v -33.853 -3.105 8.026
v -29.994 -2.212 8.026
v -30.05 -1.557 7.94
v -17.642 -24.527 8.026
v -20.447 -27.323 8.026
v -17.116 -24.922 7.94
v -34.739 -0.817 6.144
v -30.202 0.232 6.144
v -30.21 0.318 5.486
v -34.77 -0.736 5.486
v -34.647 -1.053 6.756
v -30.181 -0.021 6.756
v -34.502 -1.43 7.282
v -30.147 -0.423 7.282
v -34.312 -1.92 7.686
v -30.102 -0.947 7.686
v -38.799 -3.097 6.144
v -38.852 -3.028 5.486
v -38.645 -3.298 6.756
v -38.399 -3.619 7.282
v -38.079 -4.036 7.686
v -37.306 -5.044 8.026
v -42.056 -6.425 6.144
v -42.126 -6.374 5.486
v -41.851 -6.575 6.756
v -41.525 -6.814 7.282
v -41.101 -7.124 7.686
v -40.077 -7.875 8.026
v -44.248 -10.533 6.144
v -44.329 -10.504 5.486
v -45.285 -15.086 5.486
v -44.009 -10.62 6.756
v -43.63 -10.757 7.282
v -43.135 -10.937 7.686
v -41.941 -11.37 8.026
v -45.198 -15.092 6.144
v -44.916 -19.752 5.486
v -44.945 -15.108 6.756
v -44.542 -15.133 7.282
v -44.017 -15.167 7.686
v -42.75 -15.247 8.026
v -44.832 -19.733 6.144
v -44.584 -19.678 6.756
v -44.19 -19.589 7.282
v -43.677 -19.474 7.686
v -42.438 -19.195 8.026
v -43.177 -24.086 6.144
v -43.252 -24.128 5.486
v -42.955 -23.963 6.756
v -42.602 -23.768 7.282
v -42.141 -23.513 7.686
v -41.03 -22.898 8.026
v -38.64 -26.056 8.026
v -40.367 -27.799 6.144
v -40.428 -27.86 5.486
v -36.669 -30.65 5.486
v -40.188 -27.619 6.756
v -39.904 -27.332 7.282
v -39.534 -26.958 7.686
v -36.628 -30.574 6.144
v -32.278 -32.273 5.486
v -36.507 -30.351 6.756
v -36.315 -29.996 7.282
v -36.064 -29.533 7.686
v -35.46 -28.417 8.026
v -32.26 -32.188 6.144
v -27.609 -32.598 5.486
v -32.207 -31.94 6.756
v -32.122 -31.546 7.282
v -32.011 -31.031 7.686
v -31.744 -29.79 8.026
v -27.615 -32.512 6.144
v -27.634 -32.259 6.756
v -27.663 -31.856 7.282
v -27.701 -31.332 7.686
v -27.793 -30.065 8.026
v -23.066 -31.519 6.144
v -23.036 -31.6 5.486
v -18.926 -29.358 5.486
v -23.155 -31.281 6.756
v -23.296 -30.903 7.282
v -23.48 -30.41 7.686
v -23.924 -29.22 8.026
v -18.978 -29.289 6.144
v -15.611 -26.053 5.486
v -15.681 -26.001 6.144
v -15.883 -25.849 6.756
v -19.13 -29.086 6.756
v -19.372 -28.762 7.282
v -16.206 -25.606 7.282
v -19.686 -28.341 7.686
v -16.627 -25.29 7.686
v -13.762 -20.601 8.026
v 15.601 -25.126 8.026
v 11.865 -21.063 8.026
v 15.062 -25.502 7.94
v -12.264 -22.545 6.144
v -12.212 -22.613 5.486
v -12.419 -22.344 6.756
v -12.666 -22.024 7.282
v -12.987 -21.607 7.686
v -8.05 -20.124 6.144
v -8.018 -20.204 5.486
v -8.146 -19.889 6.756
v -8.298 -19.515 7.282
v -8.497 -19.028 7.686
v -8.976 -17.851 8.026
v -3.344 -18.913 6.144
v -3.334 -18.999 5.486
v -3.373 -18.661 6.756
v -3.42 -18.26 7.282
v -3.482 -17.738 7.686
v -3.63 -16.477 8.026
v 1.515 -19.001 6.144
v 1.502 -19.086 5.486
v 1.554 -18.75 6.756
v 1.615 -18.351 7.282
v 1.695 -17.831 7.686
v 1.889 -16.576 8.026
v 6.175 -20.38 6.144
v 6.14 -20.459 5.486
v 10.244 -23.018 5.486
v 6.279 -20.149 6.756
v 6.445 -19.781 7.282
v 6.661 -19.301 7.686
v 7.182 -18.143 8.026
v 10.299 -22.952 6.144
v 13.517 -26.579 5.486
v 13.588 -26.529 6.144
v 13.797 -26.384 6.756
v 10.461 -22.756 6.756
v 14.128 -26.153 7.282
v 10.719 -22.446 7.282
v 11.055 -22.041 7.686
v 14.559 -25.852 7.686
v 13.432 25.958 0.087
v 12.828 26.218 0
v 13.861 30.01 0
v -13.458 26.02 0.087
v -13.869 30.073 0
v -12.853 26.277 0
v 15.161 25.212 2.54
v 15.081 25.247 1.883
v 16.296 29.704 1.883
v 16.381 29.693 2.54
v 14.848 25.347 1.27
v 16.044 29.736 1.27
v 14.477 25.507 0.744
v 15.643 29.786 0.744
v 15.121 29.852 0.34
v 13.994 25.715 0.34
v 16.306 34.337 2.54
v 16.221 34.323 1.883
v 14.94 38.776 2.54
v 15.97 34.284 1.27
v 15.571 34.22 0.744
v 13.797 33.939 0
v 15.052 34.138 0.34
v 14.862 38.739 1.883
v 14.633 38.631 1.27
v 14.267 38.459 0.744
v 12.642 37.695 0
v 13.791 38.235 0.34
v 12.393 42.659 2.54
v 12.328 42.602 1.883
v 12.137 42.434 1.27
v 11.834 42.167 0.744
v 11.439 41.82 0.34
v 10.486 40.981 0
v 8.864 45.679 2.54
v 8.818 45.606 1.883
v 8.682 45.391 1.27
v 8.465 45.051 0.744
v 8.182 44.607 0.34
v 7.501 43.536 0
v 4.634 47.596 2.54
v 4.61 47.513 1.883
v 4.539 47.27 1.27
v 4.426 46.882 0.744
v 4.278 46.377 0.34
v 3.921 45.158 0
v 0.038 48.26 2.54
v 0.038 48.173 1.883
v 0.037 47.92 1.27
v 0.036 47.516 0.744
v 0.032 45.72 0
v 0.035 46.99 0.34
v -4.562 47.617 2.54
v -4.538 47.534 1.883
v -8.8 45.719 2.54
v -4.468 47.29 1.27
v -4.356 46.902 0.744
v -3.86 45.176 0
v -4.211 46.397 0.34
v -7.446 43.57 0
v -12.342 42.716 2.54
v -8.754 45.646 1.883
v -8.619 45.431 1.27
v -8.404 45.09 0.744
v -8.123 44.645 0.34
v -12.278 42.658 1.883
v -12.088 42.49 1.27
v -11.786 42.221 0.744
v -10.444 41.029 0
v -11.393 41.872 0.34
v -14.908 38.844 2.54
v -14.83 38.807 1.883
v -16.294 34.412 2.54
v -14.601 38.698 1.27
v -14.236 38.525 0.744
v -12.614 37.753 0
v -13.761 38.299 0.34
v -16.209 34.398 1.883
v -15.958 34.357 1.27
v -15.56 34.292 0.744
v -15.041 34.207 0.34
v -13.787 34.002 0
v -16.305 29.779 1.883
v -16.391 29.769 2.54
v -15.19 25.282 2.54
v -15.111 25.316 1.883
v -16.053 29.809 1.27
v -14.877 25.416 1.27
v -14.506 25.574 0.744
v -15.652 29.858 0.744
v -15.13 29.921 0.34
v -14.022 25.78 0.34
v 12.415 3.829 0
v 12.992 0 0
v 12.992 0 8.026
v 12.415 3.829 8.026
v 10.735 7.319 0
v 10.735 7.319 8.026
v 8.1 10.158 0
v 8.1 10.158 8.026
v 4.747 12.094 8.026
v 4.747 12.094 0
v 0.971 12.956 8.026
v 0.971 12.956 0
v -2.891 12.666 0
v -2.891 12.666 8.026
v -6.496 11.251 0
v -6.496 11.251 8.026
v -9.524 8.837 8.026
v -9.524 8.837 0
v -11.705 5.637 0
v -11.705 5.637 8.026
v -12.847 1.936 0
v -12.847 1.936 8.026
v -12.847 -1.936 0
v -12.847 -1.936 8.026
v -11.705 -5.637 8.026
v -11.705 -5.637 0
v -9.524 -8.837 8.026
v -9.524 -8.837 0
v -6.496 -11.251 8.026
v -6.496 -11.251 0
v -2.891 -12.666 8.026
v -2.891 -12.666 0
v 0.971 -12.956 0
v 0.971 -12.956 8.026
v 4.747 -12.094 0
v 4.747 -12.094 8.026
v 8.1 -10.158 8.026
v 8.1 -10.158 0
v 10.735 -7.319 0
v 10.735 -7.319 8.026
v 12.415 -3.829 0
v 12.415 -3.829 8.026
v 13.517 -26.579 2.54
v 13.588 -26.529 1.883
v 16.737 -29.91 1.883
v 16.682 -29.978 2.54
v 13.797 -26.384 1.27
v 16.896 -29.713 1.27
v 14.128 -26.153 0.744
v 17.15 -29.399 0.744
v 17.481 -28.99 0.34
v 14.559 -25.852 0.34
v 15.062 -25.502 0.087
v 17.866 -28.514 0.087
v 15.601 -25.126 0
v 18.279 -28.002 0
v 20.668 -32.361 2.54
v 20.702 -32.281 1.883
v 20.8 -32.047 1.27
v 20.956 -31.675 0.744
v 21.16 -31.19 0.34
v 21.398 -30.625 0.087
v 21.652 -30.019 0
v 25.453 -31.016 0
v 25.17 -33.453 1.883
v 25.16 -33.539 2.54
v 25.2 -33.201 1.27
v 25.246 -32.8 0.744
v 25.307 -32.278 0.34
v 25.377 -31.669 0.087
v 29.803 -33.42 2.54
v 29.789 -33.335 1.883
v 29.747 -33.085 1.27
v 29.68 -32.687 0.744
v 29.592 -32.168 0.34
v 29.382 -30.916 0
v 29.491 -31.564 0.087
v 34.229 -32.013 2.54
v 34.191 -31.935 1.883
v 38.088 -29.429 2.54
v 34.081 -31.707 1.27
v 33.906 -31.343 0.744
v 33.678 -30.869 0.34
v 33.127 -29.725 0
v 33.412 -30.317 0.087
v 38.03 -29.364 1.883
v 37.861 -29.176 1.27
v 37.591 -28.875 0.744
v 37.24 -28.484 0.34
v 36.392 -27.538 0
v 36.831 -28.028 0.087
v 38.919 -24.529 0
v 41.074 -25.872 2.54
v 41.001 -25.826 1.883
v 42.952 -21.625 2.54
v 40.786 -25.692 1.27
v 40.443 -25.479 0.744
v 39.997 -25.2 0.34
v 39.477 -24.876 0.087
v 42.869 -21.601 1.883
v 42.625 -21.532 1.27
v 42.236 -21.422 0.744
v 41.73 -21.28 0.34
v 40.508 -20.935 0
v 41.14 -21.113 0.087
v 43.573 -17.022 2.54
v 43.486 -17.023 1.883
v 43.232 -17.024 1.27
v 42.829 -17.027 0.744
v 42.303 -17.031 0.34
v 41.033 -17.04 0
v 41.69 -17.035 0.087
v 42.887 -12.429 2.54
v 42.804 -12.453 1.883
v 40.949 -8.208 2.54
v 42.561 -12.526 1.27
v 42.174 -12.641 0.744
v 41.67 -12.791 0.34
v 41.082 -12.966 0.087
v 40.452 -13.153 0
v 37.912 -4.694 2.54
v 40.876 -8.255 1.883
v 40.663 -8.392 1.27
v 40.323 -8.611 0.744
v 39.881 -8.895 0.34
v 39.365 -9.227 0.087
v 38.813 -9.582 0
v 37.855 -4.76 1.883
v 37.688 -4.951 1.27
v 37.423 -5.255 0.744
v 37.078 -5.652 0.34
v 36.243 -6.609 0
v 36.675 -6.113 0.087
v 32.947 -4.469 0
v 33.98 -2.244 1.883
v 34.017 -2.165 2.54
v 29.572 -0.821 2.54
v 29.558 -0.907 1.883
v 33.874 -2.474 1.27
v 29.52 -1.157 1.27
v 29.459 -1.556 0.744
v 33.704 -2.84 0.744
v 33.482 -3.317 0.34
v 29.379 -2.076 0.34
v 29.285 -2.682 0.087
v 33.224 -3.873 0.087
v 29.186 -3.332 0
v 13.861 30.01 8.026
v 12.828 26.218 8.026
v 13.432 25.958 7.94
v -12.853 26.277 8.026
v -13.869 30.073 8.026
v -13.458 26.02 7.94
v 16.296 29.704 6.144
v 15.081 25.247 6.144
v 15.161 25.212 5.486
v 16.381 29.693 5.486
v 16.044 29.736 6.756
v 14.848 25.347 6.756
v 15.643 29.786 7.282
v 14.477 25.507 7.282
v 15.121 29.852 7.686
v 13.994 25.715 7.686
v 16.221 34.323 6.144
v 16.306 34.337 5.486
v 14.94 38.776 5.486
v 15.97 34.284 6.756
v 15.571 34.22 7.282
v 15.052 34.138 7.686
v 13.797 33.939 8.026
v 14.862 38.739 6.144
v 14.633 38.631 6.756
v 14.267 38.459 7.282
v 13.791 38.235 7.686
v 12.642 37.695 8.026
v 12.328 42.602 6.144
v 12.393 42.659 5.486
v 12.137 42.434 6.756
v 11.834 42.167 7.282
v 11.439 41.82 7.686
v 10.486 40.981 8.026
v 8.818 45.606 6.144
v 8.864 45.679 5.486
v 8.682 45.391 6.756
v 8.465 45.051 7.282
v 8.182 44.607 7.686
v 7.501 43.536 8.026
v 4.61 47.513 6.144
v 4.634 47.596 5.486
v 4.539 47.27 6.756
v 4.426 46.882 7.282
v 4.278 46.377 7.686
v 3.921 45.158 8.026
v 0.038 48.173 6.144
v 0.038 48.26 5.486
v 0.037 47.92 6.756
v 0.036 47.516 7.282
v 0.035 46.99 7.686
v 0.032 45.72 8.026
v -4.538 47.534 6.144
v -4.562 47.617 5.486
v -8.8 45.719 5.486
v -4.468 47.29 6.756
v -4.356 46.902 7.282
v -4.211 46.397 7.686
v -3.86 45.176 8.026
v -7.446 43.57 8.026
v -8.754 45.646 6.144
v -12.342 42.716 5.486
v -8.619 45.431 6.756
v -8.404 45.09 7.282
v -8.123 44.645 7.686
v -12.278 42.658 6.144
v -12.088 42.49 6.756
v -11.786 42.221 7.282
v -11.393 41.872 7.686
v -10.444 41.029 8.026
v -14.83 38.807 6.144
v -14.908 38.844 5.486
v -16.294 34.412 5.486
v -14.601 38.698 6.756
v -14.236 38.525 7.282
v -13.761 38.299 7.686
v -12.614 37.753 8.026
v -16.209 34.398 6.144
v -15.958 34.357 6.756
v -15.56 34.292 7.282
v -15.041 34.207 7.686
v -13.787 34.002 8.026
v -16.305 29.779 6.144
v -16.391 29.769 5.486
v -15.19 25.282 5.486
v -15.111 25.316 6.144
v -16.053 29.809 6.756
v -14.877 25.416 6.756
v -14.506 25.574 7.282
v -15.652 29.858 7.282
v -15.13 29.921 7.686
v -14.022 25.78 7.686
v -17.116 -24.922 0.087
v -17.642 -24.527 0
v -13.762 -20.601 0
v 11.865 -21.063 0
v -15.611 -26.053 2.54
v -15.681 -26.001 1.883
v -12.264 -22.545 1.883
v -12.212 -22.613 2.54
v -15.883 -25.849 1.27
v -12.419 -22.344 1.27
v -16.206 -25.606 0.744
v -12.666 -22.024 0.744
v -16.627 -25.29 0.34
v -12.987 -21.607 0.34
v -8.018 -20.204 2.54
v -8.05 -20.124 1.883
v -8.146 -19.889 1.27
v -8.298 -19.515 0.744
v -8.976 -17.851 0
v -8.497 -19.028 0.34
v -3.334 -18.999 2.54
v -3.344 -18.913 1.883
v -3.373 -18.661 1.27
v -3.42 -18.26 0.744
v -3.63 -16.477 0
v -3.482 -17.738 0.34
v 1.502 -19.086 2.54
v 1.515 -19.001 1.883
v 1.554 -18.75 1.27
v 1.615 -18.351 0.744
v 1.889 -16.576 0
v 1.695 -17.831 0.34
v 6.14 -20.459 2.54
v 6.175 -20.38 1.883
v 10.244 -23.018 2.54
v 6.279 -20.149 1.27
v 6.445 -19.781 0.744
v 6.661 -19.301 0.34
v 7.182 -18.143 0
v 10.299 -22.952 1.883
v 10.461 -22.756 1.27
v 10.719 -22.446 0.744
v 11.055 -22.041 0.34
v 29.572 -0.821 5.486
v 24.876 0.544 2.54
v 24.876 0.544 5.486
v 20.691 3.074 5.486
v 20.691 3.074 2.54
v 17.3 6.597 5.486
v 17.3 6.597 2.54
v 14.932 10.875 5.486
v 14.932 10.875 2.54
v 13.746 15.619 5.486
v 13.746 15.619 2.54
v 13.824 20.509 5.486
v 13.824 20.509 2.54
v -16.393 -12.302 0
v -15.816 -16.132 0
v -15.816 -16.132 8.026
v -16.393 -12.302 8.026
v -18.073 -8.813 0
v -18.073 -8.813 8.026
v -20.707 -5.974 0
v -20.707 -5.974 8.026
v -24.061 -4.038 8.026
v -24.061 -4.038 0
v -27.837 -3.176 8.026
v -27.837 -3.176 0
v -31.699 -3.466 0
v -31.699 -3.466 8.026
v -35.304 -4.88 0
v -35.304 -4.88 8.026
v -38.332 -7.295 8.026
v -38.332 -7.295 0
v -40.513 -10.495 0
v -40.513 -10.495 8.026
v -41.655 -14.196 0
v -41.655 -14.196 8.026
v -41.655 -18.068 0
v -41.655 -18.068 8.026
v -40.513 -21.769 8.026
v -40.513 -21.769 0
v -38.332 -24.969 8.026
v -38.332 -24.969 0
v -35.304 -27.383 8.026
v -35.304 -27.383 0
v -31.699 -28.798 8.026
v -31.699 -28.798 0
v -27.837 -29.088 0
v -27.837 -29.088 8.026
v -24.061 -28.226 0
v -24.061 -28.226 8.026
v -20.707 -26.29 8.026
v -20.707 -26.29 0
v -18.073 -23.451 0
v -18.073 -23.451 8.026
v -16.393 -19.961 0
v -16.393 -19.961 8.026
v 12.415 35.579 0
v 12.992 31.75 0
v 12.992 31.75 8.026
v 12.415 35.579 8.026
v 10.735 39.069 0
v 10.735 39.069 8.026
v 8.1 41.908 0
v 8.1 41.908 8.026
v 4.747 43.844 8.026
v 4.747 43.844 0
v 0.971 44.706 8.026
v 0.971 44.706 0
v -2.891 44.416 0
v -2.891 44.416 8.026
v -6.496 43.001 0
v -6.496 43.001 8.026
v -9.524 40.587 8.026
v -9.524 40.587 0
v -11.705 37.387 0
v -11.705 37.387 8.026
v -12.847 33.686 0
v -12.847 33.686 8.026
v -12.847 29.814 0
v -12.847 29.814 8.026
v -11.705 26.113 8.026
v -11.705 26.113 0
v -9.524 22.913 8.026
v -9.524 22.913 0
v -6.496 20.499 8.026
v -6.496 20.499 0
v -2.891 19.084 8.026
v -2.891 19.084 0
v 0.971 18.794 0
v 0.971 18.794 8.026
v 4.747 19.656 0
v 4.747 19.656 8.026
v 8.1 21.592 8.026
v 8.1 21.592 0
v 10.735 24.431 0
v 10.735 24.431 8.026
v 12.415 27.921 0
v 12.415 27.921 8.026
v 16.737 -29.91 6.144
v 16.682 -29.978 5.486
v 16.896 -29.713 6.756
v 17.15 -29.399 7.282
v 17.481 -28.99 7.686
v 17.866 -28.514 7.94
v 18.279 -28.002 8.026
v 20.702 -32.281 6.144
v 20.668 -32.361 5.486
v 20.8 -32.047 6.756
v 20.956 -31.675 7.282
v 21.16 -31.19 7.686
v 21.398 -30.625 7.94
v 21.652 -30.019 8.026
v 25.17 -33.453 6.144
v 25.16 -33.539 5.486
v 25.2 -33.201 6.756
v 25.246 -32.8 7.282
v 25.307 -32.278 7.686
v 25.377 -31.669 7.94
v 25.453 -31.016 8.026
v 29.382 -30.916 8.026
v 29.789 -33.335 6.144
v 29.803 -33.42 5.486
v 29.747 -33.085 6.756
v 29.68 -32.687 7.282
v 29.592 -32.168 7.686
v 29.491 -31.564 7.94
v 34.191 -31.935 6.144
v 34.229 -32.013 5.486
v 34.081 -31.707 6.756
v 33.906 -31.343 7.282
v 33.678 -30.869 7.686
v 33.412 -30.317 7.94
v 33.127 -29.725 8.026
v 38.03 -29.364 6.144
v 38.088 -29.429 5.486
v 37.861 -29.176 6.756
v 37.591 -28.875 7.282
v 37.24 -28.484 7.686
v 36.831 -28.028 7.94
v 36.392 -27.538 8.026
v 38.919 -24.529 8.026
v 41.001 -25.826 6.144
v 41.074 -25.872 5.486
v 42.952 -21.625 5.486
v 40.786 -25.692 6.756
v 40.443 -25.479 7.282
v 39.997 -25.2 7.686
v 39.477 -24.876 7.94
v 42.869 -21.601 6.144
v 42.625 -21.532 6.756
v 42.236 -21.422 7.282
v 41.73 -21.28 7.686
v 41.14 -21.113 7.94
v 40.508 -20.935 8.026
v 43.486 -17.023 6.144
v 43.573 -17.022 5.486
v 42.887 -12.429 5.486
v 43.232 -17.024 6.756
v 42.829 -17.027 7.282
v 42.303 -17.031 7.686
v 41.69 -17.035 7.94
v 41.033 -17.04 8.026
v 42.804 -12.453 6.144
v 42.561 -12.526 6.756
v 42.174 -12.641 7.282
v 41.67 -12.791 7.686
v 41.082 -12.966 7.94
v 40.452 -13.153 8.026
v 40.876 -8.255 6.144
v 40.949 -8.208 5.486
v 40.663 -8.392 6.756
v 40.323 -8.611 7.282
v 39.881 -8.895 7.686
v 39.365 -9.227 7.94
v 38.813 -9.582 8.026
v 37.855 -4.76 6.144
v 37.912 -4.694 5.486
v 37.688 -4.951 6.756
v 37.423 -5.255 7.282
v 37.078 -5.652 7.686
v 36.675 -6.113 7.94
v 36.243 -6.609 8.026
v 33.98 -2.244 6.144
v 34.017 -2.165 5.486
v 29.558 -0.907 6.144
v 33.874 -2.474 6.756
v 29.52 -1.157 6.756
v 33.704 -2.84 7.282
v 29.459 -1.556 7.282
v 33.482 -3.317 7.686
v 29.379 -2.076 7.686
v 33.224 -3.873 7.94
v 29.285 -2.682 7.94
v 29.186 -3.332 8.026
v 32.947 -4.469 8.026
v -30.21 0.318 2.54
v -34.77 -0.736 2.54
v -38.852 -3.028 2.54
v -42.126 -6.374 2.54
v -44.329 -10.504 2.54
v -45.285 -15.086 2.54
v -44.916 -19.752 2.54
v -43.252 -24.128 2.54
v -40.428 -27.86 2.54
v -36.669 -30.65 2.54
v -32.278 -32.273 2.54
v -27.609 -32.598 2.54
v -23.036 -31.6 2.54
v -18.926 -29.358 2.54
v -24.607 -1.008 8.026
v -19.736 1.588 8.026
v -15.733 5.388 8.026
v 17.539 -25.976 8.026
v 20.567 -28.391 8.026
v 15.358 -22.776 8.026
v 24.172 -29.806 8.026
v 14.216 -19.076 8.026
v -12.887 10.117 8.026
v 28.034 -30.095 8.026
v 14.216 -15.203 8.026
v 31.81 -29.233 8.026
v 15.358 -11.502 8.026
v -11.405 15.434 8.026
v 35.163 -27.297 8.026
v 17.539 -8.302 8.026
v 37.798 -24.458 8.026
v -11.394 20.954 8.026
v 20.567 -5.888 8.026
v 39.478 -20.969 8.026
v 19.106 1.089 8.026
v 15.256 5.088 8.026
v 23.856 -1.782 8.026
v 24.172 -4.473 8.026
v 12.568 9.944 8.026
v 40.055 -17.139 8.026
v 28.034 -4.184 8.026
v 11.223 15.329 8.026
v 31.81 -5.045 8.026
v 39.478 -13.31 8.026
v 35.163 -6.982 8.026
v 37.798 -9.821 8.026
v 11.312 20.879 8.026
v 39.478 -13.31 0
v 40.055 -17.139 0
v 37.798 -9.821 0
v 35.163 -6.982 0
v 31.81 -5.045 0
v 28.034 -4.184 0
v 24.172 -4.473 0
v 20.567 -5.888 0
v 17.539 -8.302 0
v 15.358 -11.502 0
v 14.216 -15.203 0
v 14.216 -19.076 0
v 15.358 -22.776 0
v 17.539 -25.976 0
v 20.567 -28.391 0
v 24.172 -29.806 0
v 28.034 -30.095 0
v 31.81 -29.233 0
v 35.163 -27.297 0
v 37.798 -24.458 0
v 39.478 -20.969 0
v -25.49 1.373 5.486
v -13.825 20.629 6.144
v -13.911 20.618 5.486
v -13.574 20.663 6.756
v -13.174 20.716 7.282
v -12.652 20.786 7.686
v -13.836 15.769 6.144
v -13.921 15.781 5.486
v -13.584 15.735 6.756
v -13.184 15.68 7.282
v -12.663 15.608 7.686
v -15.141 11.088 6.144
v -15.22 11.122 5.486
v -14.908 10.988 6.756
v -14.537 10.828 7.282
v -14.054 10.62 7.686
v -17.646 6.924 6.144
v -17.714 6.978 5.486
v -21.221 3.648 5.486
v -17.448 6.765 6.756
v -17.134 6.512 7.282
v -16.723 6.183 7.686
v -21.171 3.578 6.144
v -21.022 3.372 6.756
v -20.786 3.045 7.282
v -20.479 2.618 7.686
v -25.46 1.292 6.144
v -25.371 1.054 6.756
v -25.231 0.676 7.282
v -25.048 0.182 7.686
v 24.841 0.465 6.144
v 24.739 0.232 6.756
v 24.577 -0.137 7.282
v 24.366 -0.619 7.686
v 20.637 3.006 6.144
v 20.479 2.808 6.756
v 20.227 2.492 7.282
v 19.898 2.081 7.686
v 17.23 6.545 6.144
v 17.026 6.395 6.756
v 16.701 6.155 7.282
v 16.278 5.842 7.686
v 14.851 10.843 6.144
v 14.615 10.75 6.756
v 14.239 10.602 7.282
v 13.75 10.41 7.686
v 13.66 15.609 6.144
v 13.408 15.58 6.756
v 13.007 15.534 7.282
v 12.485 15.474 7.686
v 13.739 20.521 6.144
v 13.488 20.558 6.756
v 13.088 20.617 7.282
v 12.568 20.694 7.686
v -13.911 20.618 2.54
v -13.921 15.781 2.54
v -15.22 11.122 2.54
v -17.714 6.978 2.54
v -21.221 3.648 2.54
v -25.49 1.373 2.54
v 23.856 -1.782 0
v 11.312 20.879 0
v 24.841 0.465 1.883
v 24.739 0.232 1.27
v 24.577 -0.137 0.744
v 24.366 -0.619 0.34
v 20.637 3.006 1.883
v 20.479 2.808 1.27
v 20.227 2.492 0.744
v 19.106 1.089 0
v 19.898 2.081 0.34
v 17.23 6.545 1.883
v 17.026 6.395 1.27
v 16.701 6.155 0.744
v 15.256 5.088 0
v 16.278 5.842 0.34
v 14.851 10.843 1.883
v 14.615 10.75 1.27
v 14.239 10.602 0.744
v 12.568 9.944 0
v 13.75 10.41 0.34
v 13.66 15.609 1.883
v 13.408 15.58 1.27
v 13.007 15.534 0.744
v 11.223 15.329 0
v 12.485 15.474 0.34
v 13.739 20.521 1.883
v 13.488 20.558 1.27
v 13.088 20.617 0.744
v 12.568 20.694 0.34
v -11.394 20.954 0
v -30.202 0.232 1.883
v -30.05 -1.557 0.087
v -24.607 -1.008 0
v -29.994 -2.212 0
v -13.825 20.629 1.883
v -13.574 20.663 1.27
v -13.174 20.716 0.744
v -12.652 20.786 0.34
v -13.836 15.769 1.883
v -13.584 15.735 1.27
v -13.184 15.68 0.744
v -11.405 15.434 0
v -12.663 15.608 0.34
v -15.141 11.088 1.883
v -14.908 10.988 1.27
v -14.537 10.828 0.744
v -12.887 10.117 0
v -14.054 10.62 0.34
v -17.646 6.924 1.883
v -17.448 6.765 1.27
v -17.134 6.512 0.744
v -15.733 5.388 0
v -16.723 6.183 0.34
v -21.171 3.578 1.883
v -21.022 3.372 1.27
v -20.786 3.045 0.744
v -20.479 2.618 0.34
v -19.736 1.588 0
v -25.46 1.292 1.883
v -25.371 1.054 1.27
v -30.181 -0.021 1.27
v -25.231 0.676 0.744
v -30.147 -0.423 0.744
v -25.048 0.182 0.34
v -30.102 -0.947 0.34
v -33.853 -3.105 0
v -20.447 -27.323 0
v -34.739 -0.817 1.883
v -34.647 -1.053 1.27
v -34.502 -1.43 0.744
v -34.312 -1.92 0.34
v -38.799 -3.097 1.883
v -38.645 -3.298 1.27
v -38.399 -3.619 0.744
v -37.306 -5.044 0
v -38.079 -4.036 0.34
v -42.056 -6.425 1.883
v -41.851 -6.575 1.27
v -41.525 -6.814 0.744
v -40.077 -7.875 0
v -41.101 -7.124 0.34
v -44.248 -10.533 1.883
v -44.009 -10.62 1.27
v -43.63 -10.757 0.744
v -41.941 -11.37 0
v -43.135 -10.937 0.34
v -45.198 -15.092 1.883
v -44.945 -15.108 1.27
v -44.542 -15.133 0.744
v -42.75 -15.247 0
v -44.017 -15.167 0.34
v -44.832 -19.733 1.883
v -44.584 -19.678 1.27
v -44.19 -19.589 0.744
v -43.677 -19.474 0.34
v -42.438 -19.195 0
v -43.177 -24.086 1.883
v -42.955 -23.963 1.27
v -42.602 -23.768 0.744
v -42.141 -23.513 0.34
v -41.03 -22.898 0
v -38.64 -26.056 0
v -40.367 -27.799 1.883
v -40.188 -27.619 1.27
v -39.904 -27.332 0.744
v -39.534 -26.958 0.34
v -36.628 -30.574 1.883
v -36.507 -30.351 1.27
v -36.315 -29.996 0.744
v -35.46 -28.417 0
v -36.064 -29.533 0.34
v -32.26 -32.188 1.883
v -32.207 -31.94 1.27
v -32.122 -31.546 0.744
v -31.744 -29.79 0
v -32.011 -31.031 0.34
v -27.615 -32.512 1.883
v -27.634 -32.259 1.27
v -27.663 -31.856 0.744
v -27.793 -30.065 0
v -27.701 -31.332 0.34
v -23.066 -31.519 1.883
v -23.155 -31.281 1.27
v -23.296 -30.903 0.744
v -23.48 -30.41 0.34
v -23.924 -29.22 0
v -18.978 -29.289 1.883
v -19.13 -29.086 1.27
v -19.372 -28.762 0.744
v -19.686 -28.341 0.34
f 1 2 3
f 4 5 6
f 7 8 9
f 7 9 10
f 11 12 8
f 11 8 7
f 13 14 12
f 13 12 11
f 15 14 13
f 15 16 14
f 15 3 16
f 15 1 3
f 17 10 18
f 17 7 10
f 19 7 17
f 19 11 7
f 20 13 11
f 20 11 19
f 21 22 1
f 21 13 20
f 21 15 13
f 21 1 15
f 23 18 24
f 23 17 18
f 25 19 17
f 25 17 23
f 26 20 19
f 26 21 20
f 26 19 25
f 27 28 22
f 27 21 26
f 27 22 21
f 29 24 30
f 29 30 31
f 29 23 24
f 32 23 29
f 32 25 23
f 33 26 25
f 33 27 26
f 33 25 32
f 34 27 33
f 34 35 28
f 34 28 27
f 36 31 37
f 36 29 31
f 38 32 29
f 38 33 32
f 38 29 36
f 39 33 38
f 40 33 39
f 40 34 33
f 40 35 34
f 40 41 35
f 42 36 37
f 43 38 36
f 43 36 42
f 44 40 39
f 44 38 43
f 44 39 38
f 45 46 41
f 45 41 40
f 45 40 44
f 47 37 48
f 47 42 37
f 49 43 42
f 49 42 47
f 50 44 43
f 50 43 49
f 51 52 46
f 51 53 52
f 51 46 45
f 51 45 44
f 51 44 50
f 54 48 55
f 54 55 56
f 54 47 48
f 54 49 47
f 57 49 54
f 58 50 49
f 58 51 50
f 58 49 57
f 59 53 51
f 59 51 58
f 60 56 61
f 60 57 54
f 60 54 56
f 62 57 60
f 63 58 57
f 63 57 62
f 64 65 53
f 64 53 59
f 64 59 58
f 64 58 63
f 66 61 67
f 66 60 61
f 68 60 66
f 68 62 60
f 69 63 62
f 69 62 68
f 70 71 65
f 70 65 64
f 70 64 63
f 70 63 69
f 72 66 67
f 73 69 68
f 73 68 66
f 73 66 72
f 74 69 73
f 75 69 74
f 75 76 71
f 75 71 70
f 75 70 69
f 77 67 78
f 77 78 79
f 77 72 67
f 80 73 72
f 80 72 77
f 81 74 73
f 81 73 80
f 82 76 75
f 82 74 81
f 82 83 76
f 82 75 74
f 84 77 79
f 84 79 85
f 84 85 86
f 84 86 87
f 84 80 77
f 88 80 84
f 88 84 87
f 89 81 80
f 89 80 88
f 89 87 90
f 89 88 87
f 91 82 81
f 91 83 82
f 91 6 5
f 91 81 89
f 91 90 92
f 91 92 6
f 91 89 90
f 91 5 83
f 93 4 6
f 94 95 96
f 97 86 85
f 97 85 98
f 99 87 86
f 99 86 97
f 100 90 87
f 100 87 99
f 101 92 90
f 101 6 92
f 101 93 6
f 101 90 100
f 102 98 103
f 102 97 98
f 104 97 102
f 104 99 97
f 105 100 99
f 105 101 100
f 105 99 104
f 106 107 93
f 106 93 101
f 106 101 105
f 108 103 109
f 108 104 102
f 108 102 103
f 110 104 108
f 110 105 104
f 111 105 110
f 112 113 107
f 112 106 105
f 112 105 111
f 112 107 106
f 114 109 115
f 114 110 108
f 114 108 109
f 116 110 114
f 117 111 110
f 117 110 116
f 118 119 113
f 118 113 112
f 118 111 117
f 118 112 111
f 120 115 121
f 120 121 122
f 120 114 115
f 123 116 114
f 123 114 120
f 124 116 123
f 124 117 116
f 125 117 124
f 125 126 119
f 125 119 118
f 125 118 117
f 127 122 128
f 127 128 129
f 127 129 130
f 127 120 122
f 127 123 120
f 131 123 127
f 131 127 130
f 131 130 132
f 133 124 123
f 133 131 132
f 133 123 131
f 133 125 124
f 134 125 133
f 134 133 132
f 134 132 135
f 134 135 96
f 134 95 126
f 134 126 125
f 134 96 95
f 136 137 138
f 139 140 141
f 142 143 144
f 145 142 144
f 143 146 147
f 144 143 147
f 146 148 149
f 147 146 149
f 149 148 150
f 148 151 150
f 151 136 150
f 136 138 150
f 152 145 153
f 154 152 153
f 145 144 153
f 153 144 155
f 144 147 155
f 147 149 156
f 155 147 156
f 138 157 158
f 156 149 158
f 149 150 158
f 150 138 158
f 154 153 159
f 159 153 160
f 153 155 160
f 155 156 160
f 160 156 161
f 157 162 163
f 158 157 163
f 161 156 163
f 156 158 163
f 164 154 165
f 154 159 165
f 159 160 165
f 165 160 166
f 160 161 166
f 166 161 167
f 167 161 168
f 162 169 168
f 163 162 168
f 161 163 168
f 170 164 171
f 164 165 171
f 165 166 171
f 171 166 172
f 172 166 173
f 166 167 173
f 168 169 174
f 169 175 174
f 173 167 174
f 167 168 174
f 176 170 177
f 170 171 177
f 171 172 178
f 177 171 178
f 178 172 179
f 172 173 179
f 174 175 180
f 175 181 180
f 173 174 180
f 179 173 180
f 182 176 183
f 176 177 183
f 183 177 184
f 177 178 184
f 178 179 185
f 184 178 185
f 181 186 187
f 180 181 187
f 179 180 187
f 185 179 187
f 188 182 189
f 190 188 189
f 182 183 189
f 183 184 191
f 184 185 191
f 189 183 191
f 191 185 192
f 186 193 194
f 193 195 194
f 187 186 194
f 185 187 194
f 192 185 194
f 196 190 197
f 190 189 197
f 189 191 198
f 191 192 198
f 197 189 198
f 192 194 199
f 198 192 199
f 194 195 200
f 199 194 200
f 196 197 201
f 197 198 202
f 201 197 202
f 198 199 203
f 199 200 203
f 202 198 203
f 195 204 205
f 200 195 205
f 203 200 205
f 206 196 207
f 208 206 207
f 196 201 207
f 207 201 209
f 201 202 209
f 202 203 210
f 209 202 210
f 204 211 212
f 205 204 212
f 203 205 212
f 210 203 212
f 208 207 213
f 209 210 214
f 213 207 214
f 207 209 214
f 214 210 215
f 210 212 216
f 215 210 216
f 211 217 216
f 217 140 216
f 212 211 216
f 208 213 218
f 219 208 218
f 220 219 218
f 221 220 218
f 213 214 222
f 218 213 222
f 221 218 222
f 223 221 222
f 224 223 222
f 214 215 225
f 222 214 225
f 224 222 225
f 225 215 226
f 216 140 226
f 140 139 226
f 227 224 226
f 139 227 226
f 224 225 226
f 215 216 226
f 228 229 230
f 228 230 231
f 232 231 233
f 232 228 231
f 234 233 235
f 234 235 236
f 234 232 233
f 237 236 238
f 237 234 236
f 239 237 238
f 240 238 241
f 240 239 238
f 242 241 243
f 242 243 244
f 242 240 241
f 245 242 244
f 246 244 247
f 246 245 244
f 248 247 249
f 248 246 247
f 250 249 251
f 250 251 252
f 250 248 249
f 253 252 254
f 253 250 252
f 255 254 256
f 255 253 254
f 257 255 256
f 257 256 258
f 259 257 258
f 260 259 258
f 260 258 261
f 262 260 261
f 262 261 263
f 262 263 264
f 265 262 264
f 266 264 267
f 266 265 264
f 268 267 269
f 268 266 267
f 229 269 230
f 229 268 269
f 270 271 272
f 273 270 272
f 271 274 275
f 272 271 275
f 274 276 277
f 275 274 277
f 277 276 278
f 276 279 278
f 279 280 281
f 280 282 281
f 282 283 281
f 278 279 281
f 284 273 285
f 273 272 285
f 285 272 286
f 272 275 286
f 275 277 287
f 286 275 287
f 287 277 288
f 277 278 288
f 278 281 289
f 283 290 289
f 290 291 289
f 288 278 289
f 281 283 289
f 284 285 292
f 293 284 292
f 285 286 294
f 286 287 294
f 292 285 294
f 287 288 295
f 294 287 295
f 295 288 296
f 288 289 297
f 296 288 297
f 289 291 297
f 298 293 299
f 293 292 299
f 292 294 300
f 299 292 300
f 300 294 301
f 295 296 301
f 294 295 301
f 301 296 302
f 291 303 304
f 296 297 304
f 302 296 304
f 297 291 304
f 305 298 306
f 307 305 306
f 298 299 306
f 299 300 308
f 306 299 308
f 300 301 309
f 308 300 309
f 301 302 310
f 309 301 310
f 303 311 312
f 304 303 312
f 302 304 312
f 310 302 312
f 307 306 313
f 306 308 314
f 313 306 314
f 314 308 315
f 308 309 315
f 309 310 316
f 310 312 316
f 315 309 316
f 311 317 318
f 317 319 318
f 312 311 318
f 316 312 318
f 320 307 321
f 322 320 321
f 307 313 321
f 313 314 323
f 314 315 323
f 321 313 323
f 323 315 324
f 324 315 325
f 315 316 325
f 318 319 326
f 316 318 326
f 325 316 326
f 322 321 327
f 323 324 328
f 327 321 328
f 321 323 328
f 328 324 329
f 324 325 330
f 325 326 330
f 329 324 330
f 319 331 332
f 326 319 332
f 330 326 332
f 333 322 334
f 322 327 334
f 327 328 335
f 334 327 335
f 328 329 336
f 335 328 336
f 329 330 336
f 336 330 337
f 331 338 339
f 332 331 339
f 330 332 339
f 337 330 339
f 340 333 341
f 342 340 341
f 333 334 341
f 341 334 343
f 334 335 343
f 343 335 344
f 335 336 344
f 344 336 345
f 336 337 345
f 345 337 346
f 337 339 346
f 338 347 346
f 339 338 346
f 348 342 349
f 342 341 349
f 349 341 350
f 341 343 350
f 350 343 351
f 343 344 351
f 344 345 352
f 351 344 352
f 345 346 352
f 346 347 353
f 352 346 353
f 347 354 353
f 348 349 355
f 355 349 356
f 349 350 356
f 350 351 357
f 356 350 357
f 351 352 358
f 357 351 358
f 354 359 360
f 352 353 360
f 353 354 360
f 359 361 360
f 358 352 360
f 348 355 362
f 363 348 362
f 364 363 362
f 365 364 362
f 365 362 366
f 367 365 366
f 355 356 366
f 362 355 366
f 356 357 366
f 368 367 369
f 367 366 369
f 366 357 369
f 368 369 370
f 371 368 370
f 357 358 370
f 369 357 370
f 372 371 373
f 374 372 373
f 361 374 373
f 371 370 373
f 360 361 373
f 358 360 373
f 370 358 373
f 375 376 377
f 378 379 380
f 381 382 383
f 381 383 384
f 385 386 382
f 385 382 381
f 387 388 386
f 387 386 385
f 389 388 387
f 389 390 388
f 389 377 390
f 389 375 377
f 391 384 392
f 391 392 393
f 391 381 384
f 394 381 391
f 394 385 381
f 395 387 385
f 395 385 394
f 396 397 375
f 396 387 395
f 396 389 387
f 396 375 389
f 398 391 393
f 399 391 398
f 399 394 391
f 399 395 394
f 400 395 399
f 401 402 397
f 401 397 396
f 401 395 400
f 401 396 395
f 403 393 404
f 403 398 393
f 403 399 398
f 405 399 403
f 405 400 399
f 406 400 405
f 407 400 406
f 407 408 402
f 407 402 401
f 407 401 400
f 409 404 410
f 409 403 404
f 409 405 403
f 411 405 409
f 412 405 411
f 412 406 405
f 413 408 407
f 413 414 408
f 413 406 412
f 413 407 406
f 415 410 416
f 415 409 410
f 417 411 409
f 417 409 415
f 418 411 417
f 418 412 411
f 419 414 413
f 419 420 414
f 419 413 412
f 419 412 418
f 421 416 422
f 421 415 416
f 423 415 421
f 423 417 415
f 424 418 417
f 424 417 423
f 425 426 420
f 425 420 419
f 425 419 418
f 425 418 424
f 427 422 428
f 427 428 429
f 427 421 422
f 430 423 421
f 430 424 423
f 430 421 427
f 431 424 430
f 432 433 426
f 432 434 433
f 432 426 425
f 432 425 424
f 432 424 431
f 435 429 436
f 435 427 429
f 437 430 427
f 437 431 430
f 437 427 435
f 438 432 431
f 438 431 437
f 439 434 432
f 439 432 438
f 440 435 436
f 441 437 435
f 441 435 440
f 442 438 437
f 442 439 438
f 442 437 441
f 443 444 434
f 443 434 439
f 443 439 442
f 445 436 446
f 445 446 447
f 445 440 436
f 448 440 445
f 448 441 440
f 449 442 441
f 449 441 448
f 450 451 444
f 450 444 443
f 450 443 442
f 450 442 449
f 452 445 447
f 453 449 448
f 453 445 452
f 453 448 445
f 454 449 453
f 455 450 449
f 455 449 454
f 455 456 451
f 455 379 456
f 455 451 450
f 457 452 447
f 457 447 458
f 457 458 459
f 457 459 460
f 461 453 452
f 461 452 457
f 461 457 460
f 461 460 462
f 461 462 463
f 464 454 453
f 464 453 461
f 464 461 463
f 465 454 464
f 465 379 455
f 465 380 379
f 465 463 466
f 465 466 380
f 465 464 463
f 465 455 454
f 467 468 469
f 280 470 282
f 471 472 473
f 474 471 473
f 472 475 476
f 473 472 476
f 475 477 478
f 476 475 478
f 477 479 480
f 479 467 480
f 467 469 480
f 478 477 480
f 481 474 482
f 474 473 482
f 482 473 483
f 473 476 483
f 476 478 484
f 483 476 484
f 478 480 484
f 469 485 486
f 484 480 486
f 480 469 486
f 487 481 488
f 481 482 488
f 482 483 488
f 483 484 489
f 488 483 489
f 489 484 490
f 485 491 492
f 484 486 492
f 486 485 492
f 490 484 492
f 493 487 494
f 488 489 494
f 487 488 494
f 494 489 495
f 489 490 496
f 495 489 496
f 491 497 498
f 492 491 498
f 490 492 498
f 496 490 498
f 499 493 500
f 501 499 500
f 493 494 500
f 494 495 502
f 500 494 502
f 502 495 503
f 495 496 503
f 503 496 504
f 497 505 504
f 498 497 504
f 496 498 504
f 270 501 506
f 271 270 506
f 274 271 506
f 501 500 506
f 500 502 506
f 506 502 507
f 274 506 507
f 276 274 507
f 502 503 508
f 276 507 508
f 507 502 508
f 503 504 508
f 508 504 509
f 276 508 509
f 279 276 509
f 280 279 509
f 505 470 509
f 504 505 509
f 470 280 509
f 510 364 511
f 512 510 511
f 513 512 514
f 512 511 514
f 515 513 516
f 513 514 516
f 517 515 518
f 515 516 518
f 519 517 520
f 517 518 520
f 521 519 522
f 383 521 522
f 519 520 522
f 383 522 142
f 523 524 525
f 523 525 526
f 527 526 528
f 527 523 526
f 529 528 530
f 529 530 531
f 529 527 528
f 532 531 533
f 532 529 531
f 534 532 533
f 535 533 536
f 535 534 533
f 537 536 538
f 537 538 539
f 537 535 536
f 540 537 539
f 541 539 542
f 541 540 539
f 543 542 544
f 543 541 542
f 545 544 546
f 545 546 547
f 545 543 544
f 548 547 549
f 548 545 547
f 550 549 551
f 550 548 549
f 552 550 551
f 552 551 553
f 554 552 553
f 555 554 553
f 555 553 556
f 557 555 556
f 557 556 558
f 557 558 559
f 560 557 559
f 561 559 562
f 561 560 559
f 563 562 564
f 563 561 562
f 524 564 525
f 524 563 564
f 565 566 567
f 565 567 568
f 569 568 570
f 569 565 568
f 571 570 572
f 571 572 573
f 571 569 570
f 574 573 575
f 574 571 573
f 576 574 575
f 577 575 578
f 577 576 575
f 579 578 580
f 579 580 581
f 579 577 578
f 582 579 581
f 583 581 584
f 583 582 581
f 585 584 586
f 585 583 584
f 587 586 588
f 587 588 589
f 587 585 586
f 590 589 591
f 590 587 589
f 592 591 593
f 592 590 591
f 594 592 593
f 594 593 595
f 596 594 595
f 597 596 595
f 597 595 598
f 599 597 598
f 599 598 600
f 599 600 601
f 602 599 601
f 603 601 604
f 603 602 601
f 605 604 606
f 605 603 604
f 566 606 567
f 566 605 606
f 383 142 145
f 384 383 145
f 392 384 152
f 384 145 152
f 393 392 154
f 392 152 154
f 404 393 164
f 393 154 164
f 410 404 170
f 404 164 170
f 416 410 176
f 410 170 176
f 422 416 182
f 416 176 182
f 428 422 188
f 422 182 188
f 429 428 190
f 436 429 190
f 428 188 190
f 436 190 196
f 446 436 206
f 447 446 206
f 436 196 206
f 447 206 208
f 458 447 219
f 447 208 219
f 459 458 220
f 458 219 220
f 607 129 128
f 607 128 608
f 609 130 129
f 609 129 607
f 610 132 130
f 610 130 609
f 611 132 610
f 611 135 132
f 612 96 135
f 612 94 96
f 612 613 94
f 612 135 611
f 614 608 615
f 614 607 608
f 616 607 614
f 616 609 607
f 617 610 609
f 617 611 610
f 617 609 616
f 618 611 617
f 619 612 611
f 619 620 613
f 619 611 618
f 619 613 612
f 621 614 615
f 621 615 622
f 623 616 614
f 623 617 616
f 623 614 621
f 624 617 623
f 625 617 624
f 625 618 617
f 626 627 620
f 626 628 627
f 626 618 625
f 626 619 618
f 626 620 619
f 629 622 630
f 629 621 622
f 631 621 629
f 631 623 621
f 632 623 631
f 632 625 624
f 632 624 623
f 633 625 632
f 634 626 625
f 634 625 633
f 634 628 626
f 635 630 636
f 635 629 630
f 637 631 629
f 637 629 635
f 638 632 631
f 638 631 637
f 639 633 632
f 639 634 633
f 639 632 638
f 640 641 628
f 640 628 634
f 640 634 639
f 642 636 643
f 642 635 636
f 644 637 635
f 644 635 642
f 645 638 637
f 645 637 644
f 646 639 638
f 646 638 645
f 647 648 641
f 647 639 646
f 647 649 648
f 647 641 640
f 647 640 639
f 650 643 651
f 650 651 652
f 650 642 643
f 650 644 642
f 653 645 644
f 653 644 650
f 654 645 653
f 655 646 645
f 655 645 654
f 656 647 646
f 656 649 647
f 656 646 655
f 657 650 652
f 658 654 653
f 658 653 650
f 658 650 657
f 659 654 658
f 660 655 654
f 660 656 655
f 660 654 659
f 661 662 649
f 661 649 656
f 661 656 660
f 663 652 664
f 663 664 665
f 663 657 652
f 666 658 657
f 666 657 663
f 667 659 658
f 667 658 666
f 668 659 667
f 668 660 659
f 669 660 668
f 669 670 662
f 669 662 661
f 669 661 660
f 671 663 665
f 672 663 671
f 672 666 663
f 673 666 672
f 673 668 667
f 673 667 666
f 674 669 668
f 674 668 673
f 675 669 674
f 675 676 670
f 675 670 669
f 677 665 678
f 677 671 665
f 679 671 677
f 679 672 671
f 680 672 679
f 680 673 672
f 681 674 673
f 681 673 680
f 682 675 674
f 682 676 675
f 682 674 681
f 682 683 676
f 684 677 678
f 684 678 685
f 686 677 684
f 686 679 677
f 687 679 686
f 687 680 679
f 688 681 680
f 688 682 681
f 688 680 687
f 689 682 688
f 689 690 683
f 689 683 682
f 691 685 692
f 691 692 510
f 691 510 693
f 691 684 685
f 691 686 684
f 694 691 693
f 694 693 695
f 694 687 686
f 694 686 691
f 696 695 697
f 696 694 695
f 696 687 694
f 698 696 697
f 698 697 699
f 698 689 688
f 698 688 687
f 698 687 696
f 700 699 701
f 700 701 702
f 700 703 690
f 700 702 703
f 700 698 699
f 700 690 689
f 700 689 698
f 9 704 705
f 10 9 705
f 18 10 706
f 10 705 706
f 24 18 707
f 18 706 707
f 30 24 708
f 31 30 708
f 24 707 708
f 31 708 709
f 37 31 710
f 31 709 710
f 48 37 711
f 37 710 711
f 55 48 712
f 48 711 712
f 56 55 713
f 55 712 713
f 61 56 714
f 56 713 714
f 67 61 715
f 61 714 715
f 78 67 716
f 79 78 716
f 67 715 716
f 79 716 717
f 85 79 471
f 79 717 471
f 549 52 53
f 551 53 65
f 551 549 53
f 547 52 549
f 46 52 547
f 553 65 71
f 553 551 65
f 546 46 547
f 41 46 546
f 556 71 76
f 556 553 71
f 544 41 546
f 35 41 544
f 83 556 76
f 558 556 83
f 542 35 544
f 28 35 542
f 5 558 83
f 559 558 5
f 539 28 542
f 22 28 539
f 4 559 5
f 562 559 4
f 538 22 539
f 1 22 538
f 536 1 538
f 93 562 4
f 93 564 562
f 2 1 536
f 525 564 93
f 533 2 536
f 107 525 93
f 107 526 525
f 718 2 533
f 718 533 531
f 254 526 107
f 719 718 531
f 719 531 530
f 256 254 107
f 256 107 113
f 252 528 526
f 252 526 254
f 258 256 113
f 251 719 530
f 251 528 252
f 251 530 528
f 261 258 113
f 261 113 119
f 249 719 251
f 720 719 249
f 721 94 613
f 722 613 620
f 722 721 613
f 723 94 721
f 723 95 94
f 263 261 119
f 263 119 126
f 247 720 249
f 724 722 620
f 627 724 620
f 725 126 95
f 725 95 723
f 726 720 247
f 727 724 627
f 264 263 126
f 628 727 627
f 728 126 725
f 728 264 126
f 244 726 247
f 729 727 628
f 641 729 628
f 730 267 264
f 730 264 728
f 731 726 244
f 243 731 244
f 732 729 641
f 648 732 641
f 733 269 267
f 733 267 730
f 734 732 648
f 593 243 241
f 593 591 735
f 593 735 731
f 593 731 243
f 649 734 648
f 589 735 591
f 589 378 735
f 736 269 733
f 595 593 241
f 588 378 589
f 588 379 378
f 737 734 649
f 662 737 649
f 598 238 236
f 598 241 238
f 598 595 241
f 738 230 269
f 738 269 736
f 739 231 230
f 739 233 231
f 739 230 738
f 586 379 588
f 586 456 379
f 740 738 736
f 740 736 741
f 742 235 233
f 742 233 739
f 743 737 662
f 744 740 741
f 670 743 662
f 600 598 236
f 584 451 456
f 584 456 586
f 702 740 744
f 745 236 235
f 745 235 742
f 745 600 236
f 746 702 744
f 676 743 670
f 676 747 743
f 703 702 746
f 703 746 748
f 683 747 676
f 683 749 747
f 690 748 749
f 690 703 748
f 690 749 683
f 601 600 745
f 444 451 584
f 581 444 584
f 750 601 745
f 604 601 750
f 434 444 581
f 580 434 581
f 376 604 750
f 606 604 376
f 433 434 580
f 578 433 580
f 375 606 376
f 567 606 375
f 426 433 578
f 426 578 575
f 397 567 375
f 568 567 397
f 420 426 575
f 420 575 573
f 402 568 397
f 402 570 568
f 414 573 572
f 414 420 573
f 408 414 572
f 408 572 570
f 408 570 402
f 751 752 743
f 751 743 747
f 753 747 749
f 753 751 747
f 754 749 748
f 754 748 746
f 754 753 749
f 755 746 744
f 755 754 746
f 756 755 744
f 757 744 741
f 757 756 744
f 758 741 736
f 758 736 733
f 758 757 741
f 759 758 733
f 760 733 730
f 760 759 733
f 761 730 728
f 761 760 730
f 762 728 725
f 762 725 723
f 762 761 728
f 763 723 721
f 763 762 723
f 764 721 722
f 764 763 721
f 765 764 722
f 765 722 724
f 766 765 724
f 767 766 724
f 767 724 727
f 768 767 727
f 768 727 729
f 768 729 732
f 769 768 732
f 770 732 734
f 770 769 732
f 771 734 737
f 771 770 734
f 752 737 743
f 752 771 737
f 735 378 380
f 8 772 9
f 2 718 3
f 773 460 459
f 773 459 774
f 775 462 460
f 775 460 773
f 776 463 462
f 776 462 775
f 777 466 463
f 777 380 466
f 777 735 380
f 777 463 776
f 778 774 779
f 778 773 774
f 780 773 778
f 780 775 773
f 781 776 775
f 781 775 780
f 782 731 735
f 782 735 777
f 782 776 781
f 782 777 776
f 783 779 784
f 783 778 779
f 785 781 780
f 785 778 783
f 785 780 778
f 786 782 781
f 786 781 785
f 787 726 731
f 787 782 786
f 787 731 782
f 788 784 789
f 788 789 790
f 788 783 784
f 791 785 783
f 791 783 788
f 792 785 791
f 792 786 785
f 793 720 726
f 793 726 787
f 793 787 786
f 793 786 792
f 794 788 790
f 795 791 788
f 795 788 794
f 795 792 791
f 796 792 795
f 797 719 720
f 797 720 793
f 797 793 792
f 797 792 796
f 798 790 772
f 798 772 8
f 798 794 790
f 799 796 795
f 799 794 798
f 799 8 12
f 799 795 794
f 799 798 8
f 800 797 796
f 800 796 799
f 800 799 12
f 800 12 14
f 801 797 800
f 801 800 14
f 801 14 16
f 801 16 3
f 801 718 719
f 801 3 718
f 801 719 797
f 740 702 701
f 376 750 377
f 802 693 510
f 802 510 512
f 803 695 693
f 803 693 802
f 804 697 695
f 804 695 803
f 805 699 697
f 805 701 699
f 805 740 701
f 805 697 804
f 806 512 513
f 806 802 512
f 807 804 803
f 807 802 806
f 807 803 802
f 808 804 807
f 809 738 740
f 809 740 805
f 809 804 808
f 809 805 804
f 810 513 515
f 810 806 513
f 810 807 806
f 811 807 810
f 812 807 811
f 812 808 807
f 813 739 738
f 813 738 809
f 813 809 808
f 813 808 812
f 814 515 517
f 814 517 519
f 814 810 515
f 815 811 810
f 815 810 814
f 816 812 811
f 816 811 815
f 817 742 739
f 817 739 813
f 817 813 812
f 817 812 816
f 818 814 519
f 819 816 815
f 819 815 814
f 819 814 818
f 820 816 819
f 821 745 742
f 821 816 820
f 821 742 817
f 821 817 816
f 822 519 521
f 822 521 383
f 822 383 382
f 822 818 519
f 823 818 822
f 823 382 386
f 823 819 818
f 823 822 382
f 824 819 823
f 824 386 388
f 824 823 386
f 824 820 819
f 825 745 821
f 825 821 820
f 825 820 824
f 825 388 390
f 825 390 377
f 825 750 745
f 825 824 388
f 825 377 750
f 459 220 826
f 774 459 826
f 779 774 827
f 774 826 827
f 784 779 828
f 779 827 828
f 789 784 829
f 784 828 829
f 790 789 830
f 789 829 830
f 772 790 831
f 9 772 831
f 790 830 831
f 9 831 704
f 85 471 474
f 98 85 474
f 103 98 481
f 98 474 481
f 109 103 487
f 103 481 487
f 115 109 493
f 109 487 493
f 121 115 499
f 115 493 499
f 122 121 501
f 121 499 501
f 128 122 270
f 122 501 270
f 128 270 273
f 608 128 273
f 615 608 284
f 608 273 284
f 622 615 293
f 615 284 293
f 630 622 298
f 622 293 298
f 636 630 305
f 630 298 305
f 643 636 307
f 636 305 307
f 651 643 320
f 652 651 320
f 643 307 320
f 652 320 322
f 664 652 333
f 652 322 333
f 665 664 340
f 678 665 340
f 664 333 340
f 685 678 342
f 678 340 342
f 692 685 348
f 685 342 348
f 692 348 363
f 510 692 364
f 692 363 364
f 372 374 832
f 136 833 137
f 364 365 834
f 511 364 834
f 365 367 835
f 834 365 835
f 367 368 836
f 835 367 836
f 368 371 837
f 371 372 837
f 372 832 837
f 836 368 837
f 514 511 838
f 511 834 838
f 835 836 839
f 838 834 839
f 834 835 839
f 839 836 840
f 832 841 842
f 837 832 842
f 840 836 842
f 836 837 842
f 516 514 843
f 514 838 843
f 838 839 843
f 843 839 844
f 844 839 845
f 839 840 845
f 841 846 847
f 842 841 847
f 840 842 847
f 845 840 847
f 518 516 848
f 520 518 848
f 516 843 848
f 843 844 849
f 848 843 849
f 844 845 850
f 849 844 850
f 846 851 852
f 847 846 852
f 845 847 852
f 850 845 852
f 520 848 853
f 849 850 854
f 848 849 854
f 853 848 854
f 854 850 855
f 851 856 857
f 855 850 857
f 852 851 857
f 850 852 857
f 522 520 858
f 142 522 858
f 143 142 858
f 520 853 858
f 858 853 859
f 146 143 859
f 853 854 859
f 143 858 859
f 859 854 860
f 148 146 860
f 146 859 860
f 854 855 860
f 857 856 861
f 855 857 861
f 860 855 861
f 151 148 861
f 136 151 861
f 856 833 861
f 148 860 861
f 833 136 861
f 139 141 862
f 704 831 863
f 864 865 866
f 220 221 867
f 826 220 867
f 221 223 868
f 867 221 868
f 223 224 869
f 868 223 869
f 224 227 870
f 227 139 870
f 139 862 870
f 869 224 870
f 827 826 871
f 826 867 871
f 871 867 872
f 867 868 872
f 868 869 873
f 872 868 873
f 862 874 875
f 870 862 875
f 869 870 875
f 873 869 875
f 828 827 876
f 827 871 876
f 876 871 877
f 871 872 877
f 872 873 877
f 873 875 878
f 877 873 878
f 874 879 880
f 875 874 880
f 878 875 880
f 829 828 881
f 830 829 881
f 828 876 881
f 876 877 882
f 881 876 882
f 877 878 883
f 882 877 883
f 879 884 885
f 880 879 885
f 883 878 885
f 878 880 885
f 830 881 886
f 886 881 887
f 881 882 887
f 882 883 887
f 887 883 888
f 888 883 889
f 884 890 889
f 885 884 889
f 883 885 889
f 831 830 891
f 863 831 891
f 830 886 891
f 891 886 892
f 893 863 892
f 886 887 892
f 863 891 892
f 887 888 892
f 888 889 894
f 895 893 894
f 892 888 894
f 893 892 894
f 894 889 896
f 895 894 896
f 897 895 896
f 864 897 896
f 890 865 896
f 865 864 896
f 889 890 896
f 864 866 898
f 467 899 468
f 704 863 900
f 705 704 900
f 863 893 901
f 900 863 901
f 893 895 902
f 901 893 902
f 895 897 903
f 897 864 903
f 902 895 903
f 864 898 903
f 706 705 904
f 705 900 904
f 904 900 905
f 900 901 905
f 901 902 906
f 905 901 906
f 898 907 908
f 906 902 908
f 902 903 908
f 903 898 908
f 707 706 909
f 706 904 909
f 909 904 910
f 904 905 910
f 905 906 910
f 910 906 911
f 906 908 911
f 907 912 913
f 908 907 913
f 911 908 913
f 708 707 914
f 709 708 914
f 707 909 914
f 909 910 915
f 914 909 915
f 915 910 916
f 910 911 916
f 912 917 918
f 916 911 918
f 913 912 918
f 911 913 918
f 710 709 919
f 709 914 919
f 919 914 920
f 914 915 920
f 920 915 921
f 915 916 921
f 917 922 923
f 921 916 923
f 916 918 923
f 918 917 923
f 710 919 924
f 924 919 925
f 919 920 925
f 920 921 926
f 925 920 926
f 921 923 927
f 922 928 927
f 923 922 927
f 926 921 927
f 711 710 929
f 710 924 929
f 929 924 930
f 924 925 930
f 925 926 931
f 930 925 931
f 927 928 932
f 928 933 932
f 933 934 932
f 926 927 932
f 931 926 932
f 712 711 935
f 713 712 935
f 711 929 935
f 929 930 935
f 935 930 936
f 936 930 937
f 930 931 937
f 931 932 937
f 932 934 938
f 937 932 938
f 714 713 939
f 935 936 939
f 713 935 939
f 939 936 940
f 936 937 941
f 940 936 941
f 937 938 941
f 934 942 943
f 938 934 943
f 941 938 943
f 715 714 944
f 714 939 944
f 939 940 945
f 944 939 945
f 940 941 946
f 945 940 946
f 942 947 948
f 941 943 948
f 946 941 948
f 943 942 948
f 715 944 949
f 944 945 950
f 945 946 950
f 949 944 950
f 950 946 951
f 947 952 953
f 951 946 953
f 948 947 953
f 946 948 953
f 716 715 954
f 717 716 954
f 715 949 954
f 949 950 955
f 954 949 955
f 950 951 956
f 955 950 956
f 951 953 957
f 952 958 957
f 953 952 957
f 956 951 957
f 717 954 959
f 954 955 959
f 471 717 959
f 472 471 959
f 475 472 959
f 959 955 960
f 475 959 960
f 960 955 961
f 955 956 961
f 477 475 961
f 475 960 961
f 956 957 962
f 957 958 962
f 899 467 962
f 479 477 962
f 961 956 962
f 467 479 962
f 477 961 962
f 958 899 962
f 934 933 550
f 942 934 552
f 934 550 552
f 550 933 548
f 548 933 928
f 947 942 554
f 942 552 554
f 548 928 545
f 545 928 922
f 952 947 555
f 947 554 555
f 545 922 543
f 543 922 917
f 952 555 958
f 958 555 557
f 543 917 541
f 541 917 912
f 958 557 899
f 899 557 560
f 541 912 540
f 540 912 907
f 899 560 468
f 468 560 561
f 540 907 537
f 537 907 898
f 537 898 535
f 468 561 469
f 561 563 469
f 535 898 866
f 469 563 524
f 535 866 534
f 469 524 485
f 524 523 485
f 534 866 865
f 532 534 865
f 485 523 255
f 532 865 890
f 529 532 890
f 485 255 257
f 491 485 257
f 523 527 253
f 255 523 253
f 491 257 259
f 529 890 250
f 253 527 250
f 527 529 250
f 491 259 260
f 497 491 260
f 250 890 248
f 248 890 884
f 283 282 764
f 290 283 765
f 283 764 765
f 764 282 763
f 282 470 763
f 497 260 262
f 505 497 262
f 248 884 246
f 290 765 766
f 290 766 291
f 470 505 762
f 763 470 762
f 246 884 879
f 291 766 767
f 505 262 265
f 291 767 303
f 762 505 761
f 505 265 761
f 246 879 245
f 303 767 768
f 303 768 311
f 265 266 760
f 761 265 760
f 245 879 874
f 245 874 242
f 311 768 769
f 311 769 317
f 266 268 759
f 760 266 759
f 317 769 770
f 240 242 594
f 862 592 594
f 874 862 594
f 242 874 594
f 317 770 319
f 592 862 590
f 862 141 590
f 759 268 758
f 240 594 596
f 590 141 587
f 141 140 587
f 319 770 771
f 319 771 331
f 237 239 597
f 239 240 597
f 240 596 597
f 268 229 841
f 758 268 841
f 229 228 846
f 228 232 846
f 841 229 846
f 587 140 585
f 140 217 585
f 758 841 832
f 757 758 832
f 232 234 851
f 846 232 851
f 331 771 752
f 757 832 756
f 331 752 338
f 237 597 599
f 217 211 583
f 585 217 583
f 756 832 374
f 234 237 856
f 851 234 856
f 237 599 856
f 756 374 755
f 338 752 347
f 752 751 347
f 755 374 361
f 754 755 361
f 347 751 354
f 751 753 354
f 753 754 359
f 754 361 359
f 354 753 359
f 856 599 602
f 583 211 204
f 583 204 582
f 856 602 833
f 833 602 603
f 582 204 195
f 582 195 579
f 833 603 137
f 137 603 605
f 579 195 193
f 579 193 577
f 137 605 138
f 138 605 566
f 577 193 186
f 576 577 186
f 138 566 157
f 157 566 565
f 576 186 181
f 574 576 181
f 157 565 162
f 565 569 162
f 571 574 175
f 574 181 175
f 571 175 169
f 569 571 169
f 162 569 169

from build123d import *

# Parameters (mm, degrees)
F0_R     = 12.9921
F1_DEPTH = 8.0264
F2_R     = 2.54
F3_R     = 2.54


with BuildPart() as f1:
    # F0 (on Top) → F1 (new body)
    with BuildSketch(Plane.XY):
        with BuildLine():
            ThreePointArc((-15.190386, 25.282213), (-16.326972, 8.96601), (-30.209694, 0.318447))
            ThreePointArc((-30.209694, 0.318447), (-43.252469, -24.127829), (-15.611433, -26.053302))
            ThreePointArc((-15.611433, -26.053302), (-0.912893, -18.879513), (13.517478, -26.578521))
            ThreePointArc((13.517478, -26.578521), (41.074317, -25.87225), (29.571536, -0.821018))
            ThreePointArc((29.571536, -0.821018), (15.975981, 8.658485), (15.16051, 25.21249))
            ThreePointArc((15.16051, 25.21249), (0.037928, 48.259956), (-15.190386, 25.282213))
        make_face()
        with Locations((-28.807893, -16.131935)):
            Circle(F0_R, mode=Mode.SUBTRACT)
        with Locations((27.063025, -17.139335)):
            Circle(F0_R, mode=Mode.SUBTRACT)
        Circle(F0_R, mode=Mode.SUBTRACT)
        with Locations((0, 31.75)):
            Circle(F0_R, mode=Mode.SUBTRACT)
    extrude(amount=F1_DEPTH)

    # F2
    f2_edges = [f1.edges().sort_by_distance(p)[0] for p in [
        (-0.912893, -18.879513, 8.0264),
        (-43.252469, -24.127829, 8.0264),
        (-16.326972, 8.96601, 8.0264),
        (0.037928, 48.259956, 8.0264),
        (15.975981, 8.658485, 8.0264),
        (41.074317, -25.87225, 8.0264),
    ]]
    fillet(f2_edges, radius=F2_R)

    # F3
    f3_edges = [f1.edges().sort_by_distance(p)[0] for p in [
        (-16.326972, 8.96601, 0),
        (-43.252469, -24.127829, 0),
        (-0.912893, -18.879513, 0),
        (15.975981, 8.658485, 0),
        (41.074317, -25.87225, 0),
        (0.037928, 48.259956, 0),
    ]]
    fillet(f3_edges, radius=F3_R)


solid = f1.part
